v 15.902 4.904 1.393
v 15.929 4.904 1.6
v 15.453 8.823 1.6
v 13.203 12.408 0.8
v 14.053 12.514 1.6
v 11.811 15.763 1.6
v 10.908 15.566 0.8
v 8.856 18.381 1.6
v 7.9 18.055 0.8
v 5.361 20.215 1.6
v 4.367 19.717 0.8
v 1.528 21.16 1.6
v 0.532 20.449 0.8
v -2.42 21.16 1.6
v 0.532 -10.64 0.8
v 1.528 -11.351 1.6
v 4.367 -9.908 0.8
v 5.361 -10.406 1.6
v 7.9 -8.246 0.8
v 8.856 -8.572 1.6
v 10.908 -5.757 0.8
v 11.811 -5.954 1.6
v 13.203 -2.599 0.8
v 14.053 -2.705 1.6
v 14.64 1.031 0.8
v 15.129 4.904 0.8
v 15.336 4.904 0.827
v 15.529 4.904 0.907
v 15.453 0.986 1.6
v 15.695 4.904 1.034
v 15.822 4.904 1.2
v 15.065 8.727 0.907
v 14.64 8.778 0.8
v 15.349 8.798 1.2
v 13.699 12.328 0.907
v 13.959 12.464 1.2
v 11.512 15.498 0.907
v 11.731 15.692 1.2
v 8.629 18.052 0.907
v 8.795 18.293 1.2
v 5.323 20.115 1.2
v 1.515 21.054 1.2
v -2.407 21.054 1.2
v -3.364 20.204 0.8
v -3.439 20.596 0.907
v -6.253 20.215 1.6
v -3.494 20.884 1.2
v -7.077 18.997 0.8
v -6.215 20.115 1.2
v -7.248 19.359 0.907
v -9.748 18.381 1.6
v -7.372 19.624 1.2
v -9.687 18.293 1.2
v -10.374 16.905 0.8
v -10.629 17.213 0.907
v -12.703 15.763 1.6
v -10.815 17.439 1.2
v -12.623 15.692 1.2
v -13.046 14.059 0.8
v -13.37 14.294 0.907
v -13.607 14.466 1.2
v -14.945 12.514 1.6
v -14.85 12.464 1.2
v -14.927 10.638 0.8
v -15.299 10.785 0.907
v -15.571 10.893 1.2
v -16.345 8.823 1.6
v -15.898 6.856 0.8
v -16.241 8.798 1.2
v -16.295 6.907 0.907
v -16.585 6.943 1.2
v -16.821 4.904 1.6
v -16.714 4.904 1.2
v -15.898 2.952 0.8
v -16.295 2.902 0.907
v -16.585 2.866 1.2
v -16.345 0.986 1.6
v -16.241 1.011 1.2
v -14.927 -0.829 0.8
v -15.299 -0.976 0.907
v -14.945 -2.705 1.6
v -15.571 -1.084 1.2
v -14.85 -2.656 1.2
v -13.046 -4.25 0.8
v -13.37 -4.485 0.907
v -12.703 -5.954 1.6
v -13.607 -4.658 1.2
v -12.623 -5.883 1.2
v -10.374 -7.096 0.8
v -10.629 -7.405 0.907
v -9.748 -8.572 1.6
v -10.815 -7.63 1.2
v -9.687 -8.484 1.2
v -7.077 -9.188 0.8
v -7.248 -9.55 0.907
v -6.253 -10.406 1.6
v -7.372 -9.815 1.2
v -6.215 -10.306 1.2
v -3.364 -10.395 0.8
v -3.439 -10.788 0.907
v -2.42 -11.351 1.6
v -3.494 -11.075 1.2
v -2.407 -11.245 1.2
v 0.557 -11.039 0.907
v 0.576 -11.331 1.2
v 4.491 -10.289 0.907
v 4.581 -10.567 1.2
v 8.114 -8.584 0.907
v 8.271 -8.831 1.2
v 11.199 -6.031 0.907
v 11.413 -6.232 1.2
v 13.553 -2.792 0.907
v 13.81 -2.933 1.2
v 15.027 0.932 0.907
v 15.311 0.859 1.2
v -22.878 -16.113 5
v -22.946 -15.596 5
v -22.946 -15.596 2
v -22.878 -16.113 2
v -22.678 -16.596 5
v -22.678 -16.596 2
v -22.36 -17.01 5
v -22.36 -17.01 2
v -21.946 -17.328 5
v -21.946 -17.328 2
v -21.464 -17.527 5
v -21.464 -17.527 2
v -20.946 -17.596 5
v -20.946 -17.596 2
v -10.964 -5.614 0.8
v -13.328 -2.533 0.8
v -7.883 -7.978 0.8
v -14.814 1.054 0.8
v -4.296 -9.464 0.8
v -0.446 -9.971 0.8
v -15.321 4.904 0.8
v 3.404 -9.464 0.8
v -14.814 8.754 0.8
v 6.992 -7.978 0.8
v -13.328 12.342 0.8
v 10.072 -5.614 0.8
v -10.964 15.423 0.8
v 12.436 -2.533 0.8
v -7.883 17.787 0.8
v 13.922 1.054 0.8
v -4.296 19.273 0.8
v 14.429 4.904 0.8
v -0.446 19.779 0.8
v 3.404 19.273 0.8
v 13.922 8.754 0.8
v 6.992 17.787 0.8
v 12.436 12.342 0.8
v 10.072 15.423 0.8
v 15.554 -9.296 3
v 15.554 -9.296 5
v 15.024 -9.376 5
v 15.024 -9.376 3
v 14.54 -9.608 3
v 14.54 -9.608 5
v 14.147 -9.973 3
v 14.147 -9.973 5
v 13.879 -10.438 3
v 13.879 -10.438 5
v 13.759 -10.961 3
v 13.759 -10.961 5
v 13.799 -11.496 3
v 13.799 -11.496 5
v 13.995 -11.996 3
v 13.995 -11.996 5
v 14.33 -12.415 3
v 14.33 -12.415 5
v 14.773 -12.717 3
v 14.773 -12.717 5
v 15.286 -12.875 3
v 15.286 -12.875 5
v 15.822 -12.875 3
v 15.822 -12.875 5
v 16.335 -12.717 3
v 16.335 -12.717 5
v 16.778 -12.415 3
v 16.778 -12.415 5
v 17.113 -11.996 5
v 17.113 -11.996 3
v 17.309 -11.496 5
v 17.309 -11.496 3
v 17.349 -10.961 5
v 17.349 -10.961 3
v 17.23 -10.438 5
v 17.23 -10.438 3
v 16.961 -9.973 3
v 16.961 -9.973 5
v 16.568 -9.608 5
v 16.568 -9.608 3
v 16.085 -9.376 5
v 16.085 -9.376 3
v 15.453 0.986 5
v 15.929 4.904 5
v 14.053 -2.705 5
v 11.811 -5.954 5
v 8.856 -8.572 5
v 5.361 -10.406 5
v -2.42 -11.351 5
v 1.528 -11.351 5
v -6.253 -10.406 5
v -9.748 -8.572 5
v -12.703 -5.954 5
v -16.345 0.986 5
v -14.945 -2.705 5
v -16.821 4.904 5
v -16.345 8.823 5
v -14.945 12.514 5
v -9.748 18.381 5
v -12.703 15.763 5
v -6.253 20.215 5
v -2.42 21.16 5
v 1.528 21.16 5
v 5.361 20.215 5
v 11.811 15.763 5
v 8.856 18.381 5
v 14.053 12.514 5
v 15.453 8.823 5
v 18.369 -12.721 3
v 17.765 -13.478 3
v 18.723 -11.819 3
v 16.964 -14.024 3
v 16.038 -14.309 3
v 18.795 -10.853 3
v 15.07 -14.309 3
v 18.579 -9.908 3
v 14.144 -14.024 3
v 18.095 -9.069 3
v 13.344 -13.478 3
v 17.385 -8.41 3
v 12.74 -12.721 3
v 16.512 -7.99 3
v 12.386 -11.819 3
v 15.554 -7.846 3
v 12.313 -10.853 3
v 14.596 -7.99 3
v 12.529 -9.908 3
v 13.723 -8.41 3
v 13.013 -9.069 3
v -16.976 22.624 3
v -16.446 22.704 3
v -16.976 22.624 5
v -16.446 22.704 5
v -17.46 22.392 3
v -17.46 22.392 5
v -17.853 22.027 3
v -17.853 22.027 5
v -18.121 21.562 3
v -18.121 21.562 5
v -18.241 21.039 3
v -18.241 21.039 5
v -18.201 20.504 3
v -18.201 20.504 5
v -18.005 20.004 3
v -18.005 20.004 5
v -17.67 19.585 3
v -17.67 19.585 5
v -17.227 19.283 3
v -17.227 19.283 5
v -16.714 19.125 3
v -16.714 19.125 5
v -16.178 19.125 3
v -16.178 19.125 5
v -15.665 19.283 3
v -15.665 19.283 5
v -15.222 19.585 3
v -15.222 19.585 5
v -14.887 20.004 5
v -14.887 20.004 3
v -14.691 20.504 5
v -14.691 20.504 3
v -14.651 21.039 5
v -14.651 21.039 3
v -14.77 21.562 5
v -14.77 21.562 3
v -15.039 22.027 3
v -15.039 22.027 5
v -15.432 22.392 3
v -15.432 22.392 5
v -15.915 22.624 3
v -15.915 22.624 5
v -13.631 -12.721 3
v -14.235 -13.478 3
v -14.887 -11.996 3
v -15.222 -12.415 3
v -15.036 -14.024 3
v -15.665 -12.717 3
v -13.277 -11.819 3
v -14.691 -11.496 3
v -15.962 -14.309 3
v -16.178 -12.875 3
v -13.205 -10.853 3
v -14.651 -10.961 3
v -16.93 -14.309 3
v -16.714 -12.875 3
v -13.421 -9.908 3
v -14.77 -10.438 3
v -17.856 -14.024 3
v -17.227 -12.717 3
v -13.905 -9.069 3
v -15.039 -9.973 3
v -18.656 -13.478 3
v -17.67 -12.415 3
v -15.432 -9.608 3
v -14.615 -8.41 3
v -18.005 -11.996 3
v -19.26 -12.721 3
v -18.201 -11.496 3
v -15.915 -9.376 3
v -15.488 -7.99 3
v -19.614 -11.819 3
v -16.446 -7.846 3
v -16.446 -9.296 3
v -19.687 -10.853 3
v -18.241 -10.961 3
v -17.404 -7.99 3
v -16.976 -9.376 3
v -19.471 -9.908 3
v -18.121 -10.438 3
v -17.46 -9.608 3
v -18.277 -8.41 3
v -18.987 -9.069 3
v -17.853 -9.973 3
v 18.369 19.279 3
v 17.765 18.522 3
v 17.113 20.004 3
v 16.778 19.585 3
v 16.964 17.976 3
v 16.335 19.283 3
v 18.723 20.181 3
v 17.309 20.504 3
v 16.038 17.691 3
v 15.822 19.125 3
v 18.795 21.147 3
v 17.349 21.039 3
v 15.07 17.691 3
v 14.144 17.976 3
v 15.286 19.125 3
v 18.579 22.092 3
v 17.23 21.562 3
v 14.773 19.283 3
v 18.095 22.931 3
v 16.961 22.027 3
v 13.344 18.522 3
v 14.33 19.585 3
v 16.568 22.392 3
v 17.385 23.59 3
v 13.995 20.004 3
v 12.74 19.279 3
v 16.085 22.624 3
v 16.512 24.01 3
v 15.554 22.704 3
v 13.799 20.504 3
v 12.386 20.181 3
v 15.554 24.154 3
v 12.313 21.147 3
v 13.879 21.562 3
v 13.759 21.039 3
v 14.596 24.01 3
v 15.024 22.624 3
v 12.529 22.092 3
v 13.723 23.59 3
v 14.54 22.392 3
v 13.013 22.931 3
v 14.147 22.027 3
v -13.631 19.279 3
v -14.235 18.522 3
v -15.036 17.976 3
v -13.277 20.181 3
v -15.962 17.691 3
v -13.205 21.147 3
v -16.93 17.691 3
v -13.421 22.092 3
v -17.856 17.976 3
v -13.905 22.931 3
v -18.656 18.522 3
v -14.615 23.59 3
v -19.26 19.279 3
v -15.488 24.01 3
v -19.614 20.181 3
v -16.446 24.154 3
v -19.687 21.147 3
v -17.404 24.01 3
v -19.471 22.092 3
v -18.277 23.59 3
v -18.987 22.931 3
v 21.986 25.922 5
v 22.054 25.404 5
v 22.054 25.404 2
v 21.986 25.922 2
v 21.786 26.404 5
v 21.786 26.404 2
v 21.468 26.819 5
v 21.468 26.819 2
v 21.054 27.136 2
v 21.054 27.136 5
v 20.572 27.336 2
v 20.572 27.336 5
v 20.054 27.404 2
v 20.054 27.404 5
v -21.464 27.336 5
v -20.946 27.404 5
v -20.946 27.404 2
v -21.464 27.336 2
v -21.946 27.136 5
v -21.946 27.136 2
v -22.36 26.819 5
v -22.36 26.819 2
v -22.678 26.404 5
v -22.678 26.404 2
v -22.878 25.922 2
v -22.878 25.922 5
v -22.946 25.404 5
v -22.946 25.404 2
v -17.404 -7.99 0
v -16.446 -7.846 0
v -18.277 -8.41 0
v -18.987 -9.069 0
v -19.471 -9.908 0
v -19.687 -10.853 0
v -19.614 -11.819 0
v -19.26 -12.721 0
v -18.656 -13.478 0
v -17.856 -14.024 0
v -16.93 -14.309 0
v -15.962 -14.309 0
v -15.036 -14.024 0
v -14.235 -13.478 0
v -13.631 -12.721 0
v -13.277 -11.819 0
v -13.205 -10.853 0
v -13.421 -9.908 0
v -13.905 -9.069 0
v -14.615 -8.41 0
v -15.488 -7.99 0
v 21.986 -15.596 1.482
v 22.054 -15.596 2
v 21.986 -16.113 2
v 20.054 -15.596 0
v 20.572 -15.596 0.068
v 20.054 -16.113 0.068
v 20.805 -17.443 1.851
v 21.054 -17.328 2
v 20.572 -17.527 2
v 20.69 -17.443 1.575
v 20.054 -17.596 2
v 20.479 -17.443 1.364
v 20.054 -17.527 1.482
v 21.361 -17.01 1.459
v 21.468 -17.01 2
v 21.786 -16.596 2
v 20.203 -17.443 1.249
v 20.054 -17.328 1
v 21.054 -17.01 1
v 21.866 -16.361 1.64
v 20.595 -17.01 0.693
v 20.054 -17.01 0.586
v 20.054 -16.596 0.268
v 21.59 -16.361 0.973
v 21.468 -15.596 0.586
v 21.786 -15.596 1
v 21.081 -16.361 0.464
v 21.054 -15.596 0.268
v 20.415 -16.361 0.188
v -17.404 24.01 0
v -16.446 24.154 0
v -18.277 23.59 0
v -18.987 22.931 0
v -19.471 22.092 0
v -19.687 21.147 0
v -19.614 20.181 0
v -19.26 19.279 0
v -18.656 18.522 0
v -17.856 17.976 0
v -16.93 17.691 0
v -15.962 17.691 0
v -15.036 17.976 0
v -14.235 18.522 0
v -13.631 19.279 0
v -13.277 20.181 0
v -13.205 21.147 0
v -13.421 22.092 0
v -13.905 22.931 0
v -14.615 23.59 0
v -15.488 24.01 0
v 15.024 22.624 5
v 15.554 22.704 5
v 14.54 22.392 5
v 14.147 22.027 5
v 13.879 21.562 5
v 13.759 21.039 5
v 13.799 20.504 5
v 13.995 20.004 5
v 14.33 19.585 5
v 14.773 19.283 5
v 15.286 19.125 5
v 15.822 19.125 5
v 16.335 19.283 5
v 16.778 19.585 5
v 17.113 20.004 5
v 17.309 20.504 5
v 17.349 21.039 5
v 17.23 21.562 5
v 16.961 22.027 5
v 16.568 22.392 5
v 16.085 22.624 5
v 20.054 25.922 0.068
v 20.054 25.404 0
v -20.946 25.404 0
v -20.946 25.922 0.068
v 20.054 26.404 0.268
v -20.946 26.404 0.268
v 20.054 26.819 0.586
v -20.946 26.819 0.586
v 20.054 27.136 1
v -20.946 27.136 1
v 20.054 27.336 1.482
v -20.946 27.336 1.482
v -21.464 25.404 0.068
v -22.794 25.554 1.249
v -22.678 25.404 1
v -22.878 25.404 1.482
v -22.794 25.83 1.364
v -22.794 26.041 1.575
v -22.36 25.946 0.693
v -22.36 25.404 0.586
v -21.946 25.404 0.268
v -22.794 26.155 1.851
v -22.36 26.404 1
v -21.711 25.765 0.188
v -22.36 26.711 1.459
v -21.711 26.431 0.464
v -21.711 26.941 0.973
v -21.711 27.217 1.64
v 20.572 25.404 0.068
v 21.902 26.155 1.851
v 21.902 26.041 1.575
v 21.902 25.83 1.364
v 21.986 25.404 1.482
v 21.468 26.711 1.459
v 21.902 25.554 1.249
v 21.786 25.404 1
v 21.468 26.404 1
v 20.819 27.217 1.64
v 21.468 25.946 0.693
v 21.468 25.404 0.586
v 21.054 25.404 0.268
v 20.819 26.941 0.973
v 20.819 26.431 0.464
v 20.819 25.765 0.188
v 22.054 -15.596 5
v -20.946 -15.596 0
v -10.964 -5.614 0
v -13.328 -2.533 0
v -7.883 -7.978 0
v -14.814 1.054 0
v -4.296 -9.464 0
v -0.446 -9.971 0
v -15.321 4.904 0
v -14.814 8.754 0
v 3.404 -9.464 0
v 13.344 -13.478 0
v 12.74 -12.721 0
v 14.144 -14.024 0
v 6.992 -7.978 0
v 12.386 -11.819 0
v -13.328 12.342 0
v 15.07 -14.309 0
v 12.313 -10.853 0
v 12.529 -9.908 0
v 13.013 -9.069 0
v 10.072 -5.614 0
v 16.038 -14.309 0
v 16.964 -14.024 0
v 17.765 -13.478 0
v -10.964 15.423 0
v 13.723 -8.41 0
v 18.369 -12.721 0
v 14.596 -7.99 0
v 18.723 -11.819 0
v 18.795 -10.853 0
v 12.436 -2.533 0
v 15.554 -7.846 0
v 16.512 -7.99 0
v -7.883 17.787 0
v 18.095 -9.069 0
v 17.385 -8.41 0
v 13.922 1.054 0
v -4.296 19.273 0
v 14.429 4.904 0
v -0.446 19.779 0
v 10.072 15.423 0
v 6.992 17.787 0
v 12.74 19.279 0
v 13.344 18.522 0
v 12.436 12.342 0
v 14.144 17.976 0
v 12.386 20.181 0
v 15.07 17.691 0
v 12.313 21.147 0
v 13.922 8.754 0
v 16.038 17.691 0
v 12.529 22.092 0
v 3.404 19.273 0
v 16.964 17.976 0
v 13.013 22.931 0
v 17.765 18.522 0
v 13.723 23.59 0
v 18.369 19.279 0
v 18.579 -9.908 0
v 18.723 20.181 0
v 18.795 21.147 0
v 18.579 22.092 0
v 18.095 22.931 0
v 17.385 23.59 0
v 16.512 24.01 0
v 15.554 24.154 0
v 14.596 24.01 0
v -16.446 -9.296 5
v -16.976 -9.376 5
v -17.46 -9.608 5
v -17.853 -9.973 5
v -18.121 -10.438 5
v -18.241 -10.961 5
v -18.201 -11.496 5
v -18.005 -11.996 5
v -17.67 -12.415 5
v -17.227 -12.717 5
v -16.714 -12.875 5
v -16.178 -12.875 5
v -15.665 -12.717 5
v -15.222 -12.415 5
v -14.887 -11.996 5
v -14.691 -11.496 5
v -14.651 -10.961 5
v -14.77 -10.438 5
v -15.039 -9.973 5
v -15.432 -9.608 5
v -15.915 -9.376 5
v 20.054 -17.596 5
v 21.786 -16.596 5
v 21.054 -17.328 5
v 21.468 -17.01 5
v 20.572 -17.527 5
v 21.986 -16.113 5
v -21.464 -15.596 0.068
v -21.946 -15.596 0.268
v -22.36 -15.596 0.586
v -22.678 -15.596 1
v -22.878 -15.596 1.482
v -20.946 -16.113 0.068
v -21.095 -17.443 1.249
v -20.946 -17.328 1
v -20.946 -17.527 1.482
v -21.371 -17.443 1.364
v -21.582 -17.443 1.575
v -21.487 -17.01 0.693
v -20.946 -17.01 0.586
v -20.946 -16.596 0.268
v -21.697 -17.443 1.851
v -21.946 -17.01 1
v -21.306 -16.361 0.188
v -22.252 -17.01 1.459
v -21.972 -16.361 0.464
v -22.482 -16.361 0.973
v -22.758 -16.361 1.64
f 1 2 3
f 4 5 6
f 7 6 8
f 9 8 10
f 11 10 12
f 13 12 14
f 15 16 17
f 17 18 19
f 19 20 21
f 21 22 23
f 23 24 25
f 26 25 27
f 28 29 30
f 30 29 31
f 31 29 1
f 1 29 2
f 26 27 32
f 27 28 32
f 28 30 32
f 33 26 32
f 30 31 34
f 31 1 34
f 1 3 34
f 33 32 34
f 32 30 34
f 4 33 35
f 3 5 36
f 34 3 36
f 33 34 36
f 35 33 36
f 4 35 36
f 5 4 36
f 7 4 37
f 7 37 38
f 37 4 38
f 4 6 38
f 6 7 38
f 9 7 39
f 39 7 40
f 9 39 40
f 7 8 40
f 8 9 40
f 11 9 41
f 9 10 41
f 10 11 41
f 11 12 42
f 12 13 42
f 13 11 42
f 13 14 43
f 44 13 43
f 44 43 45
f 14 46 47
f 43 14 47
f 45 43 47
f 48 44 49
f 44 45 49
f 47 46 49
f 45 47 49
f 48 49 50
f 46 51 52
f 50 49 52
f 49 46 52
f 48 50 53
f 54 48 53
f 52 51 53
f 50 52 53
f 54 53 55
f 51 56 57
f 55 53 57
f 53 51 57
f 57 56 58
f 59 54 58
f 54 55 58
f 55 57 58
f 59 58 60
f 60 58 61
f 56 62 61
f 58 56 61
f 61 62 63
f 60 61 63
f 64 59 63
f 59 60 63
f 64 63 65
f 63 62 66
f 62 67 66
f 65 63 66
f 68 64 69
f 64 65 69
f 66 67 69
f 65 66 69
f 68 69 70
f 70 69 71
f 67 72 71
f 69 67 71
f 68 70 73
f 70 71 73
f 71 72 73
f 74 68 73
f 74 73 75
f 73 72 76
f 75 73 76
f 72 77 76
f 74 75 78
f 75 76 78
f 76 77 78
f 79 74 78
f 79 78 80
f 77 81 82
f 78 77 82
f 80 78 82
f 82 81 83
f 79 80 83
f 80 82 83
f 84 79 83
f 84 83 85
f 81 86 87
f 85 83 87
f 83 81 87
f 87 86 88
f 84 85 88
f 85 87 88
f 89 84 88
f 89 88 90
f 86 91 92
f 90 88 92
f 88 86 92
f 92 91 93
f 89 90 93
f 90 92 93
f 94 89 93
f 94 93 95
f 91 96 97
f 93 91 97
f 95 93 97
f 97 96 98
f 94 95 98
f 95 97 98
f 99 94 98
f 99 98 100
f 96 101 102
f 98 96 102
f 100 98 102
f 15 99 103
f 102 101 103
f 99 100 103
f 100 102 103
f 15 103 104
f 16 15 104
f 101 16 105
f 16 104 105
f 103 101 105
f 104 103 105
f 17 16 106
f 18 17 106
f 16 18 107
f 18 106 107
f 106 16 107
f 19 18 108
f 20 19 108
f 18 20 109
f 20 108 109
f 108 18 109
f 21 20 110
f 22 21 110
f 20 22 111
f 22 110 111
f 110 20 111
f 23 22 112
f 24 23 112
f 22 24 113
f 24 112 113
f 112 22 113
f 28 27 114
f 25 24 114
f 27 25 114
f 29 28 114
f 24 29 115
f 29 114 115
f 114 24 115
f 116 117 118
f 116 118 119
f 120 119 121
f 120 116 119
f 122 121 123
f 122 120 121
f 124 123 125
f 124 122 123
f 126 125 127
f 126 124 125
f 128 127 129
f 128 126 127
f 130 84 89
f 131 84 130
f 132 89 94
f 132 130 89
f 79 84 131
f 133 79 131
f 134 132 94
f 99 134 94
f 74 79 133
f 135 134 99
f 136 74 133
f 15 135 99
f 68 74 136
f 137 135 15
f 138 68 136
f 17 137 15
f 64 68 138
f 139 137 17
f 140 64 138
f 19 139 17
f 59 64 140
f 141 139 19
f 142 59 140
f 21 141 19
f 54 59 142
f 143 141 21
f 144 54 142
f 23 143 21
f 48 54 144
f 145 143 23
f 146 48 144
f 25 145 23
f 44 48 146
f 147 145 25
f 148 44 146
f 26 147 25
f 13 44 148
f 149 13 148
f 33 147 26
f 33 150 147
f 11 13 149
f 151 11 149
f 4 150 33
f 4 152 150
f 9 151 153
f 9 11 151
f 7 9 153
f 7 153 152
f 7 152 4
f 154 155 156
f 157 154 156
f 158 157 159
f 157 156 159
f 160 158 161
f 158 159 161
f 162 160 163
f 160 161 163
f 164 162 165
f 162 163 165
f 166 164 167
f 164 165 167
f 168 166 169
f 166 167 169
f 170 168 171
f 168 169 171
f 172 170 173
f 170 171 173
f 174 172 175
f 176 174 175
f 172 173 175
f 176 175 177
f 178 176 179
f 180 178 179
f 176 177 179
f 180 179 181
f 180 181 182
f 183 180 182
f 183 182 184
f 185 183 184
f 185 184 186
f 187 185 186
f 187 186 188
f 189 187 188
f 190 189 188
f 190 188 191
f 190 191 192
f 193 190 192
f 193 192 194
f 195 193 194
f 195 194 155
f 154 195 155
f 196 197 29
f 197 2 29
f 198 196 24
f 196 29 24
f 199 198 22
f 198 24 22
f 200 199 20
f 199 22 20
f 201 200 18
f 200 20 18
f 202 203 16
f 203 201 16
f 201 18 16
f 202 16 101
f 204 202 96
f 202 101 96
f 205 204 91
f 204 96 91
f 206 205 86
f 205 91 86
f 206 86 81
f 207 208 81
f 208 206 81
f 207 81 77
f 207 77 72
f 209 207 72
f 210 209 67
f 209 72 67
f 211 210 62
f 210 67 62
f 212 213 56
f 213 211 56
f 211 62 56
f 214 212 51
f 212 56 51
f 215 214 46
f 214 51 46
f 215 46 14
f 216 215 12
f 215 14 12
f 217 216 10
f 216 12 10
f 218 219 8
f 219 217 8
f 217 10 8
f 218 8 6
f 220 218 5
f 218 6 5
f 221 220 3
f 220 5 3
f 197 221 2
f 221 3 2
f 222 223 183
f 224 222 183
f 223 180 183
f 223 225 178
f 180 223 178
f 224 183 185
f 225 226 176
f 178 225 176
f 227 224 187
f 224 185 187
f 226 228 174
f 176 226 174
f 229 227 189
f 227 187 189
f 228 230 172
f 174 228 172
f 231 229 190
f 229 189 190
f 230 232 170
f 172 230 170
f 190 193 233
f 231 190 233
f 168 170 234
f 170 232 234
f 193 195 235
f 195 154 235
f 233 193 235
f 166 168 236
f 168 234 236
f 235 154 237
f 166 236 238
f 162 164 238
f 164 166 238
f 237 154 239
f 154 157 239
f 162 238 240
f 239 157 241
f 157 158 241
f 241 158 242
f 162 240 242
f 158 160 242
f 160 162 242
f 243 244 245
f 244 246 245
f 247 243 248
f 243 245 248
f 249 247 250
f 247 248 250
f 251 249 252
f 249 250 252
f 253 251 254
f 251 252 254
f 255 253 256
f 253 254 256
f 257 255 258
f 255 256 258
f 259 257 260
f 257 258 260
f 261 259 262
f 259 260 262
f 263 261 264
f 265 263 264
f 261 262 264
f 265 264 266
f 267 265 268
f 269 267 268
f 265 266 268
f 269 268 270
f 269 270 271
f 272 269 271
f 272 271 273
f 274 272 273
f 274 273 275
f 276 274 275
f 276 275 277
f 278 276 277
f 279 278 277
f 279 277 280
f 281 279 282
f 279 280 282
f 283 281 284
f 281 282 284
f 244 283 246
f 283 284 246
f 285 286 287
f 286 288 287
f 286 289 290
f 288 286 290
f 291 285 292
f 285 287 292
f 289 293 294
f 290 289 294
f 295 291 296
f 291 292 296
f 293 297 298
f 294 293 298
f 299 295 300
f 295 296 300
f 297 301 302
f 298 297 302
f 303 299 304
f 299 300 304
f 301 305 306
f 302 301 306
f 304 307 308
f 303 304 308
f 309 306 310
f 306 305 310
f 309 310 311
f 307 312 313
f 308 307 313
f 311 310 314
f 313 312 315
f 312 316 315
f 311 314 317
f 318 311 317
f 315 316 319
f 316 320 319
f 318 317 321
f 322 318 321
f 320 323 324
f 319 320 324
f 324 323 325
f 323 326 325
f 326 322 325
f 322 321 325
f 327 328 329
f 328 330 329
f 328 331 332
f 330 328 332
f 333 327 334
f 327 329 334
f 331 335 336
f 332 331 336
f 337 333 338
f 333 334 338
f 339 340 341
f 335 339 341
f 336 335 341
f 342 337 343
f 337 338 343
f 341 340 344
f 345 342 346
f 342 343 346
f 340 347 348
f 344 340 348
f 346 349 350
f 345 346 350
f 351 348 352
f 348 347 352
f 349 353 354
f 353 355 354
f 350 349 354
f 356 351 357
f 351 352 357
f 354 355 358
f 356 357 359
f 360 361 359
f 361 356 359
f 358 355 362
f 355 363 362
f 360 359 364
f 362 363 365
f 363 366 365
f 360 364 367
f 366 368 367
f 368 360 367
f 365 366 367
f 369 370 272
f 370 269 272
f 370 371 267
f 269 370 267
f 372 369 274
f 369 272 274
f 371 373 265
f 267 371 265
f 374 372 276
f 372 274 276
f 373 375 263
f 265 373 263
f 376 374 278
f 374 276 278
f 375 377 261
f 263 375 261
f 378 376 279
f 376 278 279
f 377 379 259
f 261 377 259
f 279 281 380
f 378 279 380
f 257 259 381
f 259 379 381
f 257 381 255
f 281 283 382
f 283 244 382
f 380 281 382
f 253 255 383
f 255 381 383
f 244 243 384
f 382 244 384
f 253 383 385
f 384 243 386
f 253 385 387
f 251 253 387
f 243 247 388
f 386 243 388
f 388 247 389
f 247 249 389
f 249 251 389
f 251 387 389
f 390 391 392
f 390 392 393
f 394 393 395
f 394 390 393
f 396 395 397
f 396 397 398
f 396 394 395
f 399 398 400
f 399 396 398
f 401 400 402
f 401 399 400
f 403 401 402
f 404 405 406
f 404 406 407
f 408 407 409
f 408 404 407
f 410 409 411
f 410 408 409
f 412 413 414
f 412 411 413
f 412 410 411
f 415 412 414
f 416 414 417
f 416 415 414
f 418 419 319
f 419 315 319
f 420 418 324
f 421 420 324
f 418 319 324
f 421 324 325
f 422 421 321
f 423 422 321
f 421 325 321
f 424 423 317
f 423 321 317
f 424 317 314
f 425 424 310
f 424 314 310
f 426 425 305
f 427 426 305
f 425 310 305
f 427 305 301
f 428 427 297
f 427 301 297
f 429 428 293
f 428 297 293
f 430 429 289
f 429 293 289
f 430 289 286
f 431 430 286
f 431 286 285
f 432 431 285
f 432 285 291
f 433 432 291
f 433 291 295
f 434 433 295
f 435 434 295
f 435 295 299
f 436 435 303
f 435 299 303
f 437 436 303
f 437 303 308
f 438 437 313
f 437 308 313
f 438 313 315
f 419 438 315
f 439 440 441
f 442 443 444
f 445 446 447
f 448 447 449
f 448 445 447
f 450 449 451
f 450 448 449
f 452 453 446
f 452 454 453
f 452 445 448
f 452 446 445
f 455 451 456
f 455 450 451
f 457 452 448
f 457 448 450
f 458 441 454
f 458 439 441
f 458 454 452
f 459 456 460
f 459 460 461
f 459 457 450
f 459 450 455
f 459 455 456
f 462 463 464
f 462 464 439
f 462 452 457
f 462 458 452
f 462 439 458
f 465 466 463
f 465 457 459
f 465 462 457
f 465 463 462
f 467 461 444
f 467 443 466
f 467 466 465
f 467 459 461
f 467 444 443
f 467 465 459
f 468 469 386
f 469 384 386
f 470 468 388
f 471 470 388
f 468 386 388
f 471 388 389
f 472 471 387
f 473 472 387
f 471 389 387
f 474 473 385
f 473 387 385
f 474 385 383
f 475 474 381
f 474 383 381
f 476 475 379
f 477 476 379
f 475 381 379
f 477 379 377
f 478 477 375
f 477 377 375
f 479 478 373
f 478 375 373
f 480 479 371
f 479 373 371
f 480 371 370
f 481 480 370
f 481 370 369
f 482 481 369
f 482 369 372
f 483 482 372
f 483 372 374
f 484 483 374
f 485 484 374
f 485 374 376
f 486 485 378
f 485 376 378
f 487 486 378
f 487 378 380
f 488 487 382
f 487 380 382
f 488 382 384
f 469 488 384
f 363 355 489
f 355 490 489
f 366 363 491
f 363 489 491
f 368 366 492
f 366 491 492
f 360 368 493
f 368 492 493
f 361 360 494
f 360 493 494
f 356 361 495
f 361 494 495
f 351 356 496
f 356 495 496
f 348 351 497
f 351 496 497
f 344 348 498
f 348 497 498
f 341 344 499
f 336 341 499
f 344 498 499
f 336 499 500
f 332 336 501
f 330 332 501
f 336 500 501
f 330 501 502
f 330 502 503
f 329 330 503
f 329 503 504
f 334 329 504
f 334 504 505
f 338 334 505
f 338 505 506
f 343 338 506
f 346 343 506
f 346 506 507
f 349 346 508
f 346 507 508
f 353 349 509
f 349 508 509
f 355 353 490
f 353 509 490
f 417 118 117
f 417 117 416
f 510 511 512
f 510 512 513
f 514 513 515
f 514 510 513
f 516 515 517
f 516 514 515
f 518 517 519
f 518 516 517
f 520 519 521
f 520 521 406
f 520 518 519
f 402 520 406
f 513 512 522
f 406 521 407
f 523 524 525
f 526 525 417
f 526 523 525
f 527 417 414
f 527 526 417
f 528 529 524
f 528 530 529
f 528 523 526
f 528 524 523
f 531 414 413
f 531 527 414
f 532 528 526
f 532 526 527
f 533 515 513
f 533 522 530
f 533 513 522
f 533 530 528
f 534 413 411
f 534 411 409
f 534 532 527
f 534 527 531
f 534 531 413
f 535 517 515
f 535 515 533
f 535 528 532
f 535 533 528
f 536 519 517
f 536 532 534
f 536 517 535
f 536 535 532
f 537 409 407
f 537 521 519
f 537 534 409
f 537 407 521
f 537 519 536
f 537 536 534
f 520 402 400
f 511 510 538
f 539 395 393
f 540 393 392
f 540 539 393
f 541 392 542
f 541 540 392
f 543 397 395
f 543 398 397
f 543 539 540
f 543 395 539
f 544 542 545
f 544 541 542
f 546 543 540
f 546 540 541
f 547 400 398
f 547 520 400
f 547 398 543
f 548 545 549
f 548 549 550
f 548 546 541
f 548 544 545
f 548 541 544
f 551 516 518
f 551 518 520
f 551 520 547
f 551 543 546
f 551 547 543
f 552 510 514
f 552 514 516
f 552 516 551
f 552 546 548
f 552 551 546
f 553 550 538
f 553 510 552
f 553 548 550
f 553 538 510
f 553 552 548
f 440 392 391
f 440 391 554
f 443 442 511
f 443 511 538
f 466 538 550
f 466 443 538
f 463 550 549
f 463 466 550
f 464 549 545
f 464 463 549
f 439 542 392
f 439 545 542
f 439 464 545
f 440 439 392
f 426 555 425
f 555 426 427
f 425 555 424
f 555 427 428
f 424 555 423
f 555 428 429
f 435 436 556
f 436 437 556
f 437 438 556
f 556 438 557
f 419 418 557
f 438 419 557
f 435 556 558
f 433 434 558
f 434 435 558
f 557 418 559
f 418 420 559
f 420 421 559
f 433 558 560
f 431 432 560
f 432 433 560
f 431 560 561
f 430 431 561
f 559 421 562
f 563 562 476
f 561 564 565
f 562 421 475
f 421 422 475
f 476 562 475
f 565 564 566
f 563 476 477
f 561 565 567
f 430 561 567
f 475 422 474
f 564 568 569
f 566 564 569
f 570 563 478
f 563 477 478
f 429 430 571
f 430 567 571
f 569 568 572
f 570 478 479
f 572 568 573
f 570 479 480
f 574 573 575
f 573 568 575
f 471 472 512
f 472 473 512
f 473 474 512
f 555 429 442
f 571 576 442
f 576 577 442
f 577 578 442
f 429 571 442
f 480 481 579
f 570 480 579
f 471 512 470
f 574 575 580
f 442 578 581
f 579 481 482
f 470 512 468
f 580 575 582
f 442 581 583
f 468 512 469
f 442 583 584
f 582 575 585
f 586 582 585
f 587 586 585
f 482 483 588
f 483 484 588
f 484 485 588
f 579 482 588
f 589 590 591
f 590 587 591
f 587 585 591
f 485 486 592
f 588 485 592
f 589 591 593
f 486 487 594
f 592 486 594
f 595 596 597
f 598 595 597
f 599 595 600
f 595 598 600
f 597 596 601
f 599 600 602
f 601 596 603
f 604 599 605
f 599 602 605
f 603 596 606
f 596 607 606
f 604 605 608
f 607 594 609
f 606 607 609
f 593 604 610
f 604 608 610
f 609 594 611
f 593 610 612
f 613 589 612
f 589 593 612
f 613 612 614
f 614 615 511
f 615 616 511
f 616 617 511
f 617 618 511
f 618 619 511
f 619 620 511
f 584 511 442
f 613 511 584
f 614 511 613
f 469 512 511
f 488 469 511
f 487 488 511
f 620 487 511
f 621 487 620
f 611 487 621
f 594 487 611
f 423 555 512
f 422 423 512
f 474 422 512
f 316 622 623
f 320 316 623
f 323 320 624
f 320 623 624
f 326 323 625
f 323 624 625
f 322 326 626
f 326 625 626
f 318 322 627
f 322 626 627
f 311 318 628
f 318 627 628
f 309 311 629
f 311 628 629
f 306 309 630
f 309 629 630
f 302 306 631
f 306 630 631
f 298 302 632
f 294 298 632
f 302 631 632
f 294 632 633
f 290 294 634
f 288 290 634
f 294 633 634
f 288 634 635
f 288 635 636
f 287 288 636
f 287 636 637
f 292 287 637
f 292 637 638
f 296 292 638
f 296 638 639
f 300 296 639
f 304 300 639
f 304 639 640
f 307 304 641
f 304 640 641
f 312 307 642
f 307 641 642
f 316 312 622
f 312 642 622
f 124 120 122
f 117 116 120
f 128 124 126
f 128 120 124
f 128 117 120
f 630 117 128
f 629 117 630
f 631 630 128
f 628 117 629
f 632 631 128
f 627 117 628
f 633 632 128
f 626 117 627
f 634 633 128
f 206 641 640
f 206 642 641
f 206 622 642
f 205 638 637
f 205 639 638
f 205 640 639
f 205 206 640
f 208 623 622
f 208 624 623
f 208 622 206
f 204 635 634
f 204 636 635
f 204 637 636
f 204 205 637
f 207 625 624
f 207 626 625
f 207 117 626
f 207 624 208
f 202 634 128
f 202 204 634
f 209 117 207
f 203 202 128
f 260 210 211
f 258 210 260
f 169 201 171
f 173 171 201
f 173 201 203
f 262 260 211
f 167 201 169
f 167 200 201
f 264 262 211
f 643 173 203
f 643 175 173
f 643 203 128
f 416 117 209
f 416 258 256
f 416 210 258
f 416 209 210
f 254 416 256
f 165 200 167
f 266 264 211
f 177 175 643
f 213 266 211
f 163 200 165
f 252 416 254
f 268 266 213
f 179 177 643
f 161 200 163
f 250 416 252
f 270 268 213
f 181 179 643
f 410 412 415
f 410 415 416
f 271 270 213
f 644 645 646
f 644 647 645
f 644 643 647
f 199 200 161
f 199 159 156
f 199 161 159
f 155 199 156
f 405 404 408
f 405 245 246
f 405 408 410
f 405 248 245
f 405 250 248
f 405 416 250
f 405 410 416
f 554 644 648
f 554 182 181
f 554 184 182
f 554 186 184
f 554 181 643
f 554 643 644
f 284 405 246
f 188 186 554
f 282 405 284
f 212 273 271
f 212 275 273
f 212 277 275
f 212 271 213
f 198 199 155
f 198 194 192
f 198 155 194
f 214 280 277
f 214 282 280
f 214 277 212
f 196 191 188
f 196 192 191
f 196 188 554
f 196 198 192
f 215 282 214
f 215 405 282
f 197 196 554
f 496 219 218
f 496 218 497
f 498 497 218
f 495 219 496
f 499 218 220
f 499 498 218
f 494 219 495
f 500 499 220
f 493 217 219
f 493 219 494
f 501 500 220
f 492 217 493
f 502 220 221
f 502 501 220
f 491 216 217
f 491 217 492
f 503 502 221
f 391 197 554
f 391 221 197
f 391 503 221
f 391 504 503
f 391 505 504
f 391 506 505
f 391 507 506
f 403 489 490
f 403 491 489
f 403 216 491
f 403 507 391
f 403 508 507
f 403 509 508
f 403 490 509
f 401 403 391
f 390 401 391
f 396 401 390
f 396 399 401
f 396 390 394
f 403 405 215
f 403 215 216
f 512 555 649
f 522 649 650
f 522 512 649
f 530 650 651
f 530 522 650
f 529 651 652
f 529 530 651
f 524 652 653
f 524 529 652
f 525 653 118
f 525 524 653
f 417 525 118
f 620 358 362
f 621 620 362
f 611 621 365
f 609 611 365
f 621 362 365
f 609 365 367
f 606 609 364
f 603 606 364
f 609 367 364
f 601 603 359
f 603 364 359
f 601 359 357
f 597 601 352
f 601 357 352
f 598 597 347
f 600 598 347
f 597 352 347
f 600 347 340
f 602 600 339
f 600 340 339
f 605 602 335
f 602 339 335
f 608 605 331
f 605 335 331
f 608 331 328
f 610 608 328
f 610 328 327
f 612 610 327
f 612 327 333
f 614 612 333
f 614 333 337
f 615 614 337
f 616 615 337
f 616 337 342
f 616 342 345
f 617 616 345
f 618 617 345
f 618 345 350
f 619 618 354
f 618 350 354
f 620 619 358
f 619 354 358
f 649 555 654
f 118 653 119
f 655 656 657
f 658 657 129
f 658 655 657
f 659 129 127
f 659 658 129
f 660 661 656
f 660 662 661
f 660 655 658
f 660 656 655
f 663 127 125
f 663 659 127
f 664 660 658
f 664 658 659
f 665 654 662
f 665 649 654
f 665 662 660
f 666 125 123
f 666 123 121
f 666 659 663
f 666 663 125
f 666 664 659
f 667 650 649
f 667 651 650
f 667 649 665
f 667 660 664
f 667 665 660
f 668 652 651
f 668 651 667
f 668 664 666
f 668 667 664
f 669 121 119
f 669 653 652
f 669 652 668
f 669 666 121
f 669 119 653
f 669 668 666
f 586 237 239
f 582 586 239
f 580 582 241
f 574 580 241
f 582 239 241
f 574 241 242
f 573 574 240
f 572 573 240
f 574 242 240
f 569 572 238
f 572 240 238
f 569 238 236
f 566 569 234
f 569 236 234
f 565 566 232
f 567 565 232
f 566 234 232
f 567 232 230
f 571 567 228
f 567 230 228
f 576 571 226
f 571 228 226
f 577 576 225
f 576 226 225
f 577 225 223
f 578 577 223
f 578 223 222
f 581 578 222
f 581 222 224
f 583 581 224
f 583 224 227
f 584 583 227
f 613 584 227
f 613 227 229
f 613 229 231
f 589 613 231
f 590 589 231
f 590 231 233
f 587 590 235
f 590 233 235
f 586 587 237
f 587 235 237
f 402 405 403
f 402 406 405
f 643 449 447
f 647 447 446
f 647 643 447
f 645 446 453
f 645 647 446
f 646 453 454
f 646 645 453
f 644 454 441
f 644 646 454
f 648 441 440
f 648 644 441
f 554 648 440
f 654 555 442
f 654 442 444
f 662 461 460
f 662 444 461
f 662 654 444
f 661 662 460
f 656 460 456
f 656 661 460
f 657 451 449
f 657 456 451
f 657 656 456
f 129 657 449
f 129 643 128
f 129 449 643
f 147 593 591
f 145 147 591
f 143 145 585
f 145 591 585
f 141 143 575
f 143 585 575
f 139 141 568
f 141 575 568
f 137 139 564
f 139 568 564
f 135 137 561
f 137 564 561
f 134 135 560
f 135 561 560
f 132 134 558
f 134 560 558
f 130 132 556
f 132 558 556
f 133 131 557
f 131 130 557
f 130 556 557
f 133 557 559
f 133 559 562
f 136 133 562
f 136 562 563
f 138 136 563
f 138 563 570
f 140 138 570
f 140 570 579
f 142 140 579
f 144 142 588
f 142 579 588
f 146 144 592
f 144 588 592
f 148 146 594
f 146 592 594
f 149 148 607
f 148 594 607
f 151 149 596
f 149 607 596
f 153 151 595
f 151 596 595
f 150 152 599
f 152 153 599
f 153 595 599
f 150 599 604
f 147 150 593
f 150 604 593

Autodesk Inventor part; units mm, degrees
ref_plane "YZ Plane" through (0, 0, 0) normal (1, 0, 0) x (0, 1, 0)
ref_plane "XZ Plane" through (0, 0, 0) normal (0, 1, 0) x (-1, 0, 0)
ref_plane "XY Plane" through (0, 0, 0) normal (0, 0, 1) x (1, 0, 0)
sketch "Sketch1: base" plane through (0, 0, 0) normal (0, 0, 1) x (1, 0, 0)
  line L0 (-22.9459, 27.4044) -> (22.0541, 27.4044)
  line L1 (22.0541, 27.4044) -> (22.0541, -17.5956)
  line L2 (22.0541, -17.5956) -> (-22.9459, -17.5956)
  line L3 (-22.9459, -17.5956) -> (-22.9459, 27.4044)
  circle A0 centre (-0.4459, 4.9044) radius 16.375
  line L4 (-16.4459, 20.9044) -> (15.5541, 20.9044) construction
  line L5 (15.5541, 20.9044) -> (15.5541, -11.0956) construction
  line L6 (15.5541, -11.0956) -> (-16.4459, -11.0956) construction
  line L7 (-16.4459, -11.0956) -> (-16.4459, 20.9044) construction
  circle A1 centre (-0.4459, 4.9044) radius 14.875
  circle A2 centre (15.5541, 20.9044) radius 1.8 construction
  circle A3 centre (15.5541, 20.9044) radius 3.25 construction
  point P0 (0, 0)
  point P1 (22.0541, 4.9044)
  point P2 (-0.4459, 27.4044)
  point P3 (-0.4459, 20.9044)
  point P4 (-16.4459, 4.9044)
  dimension "d0" = 32.75
  dimension "d1" = 45
  dimension "d4" = 32
  dimension "d16" = 1.5
  dimension "d19" = 6.5
  dimension "d20" = 3.6
  dimension "d21" = 6.5
extrude "Ex1: base" add sketch "Sketch1: base" along normal blind 5 contours L0 L1 L2 L3
hole "Hole1: M3 screws" at (-16.4459, 20.9044, 0) at (15.5541, 20.9044, 0) at (-16.4459, -11.0956, 0) at (15.5541, -11.0956, 0) direction (0, 0, 1) diameter 3.6 end through all counterbore diameter 6.5 counterbore depth 3 clearance for "Socket Head Cap Screw" size "M3" standard "Ansi Metric M Profile"
fillet "Fillet1" radius 2 8 edges at (-0.4459, 27.4044, 0) (22.0541, 4.9044, 0) (22.0541, 27.4044, 2.5) (-22.9459, 4.9044, 0) (-0.4459, -17.5956, 0) (22.0541, -17.5956, 2.5) (-22.9459, -17.5956, 2.5) (-22.9459, 27.4044, 2.5)
extrude "Ex2: stopper" add sketch "Sketch1: base" along normal blind 0.8 contours A0
fillet "Fillet2 (for printing)" radius 0.8 1 edges at (-16.8209, 4.9044, 0.8)
properties part number "cage_inside_01"
